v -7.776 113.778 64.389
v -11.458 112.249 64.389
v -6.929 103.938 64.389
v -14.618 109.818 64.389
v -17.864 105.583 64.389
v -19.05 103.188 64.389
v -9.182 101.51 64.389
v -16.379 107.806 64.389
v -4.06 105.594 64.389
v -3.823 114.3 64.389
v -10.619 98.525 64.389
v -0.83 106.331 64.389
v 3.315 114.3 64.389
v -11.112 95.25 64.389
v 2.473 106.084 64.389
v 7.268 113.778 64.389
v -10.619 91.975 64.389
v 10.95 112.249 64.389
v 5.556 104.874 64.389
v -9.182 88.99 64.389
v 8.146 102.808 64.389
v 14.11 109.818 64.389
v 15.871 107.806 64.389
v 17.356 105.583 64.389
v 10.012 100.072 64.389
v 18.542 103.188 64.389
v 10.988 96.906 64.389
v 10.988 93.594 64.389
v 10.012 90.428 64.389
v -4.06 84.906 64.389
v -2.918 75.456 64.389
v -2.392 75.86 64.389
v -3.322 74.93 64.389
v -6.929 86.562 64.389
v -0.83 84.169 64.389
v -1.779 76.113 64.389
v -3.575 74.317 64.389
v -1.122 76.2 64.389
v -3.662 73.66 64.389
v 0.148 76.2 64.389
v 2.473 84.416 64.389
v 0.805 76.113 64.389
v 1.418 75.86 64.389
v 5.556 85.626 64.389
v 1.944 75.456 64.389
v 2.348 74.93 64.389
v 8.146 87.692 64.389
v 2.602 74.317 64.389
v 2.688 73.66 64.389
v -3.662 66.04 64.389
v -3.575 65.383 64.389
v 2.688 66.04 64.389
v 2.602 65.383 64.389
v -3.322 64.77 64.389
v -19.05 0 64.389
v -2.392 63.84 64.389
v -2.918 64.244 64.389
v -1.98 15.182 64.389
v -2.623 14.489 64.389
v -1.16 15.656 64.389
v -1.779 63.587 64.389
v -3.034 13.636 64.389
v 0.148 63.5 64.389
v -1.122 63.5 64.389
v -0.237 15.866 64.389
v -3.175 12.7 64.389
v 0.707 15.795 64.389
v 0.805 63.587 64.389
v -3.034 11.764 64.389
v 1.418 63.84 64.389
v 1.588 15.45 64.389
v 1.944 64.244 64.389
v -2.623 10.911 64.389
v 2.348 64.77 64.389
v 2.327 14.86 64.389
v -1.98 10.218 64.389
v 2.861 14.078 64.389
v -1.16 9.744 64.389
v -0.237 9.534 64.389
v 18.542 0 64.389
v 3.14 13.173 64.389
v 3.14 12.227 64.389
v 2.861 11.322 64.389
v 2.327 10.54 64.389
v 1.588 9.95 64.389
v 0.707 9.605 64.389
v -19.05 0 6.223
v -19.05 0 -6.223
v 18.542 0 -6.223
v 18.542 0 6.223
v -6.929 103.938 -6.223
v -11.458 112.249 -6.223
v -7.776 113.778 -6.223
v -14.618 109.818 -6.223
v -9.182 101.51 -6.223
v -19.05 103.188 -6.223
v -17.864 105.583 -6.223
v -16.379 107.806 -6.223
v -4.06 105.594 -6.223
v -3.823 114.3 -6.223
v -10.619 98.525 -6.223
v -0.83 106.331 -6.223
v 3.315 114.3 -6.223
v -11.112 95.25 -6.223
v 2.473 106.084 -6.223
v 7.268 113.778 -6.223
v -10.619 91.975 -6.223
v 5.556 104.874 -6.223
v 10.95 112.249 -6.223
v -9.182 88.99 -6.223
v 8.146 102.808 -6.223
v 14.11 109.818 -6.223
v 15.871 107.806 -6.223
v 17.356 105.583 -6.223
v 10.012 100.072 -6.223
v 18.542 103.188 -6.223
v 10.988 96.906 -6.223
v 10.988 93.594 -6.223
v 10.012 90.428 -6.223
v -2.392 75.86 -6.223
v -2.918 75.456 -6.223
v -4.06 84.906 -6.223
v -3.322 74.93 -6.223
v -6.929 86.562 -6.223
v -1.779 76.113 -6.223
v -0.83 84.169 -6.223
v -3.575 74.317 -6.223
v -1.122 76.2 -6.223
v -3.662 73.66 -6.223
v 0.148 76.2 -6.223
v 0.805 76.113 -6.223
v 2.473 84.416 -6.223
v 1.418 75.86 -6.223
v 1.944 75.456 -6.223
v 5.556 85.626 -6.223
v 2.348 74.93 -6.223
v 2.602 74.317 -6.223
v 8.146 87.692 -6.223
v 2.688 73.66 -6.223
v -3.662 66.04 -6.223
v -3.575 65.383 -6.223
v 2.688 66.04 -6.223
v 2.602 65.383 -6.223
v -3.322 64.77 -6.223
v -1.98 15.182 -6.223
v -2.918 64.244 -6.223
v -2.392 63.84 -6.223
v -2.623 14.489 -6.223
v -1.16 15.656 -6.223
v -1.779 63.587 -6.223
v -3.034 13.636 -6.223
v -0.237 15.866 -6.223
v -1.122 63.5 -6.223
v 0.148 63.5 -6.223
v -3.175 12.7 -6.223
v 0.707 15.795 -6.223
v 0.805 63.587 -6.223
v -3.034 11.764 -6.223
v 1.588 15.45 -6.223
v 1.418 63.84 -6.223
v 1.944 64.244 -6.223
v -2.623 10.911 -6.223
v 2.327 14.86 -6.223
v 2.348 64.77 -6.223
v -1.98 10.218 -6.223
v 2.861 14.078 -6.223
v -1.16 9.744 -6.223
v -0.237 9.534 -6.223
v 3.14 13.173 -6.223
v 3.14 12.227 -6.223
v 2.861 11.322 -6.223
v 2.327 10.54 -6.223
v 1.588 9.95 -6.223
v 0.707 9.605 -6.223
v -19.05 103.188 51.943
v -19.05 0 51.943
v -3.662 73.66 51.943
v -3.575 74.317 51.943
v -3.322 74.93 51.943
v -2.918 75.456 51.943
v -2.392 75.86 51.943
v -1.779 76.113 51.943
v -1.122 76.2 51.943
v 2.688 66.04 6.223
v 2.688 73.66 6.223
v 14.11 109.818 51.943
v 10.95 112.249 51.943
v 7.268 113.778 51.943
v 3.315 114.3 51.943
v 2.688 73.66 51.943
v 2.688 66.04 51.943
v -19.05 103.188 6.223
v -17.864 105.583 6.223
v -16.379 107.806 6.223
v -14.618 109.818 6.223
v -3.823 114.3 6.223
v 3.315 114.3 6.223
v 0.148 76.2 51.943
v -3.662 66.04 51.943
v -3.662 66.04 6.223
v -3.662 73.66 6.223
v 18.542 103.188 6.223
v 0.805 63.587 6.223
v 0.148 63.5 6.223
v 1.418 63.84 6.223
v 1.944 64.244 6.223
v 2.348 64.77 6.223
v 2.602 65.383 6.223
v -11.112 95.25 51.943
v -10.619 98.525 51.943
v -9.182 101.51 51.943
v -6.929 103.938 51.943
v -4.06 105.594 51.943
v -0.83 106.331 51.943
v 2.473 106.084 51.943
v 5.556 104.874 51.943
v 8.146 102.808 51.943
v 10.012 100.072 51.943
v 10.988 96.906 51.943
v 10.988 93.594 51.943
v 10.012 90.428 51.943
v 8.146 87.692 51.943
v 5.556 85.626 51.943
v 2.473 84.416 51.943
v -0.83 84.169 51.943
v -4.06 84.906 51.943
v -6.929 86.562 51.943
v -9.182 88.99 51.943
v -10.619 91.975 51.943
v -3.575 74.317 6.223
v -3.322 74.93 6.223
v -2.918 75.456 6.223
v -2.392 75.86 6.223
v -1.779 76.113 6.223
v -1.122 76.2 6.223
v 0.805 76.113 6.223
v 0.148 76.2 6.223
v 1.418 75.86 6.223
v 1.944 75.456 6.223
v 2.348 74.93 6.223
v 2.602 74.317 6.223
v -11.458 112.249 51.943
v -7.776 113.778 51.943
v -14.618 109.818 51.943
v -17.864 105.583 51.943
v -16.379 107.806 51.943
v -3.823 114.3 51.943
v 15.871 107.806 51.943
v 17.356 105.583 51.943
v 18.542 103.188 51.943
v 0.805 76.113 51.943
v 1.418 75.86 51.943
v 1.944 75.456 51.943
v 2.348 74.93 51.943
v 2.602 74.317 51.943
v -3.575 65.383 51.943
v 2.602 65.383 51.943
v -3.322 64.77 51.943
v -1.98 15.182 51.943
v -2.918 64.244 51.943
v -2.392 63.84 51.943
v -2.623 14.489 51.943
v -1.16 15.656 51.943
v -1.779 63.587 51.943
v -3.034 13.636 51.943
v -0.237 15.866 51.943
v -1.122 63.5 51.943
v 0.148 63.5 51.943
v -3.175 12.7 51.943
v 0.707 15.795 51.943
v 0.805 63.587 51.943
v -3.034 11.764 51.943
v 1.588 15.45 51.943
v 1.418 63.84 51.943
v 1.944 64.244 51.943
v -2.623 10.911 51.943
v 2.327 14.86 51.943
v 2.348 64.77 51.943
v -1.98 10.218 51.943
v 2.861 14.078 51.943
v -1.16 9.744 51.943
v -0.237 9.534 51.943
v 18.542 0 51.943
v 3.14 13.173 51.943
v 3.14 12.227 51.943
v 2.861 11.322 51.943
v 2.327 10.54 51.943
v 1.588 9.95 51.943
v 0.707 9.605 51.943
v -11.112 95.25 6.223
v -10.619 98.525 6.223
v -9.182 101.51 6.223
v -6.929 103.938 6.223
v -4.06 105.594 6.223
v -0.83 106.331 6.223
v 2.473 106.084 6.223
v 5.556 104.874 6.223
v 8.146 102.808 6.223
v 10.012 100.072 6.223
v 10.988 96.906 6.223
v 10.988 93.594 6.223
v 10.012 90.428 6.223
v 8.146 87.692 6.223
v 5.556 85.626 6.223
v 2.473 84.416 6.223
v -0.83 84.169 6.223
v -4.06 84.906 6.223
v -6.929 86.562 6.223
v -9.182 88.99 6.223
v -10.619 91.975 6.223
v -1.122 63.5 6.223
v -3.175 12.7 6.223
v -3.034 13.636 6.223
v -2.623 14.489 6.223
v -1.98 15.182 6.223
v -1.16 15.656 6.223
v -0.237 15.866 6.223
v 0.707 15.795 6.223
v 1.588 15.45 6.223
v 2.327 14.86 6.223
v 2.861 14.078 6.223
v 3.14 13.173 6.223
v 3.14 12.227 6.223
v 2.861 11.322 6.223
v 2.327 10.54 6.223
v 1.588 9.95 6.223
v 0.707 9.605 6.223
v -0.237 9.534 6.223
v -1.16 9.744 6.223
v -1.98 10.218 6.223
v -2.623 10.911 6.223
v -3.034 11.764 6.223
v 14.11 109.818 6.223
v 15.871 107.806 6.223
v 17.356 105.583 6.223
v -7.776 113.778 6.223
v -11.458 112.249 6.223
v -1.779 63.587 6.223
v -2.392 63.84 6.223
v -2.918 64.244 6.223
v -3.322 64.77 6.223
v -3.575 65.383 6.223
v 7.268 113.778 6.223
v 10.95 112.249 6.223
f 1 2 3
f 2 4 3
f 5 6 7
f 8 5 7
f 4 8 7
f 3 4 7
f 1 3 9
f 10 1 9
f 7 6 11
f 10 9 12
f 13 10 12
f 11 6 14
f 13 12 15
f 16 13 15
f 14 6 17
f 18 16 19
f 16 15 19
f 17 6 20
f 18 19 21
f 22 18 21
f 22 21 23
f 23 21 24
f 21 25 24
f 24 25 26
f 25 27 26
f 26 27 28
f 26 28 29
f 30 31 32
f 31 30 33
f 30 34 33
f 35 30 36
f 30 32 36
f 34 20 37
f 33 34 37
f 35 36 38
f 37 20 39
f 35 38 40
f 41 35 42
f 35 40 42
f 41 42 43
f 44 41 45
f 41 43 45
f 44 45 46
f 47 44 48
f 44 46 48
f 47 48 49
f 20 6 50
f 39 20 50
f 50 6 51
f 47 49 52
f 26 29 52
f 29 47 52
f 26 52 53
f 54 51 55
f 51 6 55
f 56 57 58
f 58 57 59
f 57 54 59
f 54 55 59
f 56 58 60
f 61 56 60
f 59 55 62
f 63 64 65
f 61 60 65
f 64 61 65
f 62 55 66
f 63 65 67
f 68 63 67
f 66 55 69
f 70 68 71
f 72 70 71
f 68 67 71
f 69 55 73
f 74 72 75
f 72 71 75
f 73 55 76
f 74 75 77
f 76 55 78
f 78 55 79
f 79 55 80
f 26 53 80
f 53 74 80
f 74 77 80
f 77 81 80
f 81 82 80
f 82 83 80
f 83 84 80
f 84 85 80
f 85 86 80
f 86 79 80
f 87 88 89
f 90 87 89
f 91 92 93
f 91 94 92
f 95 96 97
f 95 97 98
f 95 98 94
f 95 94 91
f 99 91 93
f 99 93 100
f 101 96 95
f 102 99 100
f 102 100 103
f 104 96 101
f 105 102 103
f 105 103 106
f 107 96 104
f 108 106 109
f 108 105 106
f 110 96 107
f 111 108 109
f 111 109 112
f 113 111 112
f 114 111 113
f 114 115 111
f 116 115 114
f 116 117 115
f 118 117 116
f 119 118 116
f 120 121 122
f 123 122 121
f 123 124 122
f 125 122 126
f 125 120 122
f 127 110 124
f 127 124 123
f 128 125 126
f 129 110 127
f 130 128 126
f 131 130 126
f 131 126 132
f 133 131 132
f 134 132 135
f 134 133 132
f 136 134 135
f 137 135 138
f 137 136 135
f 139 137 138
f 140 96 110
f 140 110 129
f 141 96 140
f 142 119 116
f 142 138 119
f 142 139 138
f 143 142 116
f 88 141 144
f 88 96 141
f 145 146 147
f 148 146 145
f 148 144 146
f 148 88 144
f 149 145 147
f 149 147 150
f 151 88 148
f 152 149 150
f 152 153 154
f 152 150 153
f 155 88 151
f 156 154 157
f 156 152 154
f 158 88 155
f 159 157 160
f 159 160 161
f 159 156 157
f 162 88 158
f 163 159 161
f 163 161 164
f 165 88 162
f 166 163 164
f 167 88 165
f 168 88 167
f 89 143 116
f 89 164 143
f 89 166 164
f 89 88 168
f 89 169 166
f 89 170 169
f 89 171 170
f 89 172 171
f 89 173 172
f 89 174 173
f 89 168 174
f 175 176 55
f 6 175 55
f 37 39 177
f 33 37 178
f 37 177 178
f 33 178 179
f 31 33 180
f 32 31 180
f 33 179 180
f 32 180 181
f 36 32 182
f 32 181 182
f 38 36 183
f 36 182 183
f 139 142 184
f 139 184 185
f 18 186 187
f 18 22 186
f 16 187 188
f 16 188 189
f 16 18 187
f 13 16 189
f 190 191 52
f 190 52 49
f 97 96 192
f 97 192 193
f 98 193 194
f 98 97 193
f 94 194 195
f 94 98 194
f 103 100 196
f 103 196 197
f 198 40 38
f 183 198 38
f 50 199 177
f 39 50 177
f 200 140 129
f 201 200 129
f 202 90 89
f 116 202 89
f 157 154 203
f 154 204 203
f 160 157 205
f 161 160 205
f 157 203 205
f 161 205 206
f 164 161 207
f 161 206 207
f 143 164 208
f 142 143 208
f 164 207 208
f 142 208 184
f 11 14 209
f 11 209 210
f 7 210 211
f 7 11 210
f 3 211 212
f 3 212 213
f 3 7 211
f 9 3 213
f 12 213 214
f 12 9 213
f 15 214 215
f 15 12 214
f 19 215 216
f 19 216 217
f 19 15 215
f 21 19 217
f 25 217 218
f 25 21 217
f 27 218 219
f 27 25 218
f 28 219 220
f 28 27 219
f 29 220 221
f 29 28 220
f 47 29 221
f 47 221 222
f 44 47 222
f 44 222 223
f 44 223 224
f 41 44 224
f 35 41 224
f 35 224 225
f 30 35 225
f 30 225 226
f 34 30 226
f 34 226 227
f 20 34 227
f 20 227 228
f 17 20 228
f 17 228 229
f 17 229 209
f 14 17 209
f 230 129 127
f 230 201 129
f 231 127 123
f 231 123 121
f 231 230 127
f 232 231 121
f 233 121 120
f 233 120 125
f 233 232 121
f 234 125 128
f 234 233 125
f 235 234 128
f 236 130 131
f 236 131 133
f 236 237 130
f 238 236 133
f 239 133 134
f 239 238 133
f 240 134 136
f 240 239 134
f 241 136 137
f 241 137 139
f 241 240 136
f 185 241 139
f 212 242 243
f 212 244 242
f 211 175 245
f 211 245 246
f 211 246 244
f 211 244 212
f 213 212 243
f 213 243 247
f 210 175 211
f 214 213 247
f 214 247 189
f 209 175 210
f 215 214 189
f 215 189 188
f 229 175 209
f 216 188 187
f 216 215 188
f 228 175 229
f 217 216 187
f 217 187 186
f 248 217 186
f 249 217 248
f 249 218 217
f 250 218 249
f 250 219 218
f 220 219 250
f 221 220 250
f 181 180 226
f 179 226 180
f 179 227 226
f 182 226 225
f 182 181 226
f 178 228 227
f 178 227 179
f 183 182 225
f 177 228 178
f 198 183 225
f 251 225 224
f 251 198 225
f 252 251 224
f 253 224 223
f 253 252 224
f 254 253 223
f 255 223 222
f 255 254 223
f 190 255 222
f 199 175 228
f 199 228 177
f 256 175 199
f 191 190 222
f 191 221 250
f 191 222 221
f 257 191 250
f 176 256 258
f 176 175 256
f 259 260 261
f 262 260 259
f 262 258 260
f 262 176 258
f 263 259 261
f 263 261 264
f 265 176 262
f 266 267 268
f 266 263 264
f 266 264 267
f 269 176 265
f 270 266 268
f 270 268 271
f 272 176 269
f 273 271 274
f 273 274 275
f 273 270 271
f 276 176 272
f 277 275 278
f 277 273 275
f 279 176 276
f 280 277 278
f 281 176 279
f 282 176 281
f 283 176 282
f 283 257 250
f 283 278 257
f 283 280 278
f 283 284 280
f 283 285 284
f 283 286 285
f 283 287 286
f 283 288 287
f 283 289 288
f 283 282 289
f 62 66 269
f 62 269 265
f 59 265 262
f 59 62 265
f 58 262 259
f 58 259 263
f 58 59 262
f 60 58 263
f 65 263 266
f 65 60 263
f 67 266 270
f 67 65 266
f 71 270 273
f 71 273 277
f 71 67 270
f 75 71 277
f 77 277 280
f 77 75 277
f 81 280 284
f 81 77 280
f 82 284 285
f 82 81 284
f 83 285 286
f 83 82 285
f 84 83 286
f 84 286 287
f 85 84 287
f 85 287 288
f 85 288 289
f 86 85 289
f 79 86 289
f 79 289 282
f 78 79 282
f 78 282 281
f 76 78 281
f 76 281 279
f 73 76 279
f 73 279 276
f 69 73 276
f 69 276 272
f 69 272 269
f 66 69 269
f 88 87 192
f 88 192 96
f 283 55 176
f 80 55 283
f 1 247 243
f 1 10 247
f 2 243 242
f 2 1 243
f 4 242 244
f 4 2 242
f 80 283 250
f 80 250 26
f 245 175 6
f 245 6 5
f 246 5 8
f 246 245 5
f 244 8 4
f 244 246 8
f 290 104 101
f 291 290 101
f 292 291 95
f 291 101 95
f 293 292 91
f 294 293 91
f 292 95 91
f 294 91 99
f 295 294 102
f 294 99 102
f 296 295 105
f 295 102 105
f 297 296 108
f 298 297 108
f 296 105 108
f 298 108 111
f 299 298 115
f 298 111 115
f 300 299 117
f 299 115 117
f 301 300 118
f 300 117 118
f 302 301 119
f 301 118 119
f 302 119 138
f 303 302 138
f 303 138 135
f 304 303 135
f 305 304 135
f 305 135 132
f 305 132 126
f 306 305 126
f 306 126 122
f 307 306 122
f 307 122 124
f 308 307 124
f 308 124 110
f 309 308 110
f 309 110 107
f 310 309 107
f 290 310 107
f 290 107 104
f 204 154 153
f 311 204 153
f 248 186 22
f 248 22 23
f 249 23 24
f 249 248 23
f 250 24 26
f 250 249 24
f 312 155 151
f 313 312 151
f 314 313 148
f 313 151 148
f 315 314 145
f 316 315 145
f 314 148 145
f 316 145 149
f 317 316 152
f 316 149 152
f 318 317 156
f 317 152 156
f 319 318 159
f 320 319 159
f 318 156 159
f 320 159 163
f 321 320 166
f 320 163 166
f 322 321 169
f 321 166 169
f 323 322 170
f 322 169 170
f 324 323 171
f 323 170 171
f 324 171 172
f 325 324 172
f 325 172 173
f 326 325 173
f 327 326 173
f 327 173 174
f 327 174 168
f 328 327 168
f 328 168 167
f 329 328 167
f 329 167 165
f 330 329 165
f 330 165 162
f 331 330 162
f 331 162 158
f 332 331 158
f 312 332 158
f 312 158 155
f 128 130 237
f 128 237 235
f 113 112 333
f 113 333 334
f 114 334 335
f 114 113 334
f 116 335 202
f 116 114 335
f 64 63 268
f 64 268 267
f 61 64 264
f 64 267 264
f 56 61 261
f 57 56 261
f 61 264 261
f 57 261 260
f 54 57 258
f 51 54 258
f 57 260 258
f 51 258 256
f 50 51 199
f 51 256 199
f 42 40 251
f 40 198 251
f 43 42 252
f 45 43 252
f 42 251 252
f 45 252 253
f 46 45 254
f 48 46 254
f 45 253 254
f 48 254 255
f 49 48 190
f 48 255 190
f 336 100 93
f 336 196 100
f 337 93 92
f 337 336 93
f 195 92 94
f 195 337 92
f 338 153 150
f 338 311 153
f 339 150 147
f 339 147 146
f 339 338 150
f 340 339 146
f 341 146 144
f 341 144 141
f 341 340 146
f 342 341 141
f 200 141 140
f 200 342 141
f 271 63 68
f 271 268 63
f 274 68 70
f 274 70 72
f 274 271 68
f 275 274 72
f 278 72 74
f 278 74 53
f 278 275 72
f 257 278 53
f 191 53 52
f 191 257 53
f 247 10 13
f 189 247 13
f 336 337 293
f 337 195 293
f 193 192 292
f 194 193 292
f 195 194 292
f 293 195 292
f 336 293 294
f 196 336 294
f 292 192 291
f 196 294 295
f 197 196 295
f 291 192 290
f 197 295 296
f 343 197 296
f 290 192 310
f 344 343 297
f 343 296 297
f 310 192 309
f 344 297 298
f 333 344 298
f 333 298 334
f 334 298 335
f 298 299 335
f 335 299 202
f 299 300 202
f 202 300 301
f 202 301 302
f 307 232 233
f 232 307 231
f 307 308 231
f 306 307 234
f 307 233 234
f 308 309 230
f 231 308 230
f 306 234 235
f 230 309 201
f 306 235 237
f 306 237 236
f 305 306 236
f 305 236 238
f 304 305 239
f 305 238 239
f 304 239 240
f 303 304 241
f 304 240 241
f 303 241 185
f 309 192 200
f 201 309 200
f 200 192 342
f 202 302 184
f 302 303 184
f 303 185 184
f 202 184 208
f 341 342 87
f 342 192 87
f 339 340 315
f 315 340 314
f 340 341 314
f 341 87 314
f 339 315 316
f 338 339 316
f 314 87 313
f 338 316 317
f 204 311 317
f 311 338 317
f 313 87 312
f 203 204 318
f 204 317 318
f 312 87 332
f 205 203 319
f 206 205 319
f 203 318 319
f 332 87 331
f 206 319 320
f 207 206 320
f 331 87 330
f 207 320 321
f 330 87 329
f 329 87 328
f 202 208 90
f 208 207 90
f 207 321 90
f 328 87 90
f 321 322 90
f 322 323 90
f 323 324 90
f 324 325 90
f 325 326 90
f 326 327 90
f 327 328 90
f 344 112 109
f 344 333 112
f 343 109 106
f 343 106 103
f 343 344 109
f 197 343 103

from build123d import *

# Parameters (mm, degrees)
SKETCH2_W           = 37.592
SKETCH2_H           = 12.446
BOSS_EXTRUDE1_DEPTH = 114.3
SKETCH3_R           = 3.175
CUT_EXTRUDE1_DEPTH  = 12.7
SKETCH4_R           = 11.1125
CUT_EXTRUDE2_DEPTH  = 12.7
SKETCH5_W           = 6.35
SKETCH5_H           = 12.7
CUT_EXTRUDE3_DEPTH  = 12.7
FILLET2_R           = 2.54
FILLET3_R           = 2.54
CUT_EXTRUDE4_START  = -70.612
CUT_EXTRUDE4_DEPTH  = 70.612
FILLET4_R           = 15.24
FILLET5_R           = 15.24


with BuildPart() as part:
    # Sketch2 → Boss-Extrude1 (new body)
    with BuildSketch(Plane(origin=(0, 0, 0), x_dir=(1, 0, 0), z_dir=(0, 1, 0))):
        with Locations((-0.254, 0)):
            Rectangle(SKETCH2_W, SKETCH2_H)
    extrude(amount=BOSS_EXTRUDE1_DEPTH)

    # Sketch3 → Cut-Extrude1 (cut)
    with BuildSketch(Plane(origin=(0, 0, -6.223), x_dir=(-1, 0, 0), z_dir=(0, 0, -1))):
        with Locations((0, 12.7)):
            Circle(SKETCH3_R)
    extrude(amount=-CUT_EXTRUDE1_DEPTH, mode=Mode.SUBTRACT)

    # Sketch4 → Cut-Extrude2 (cut)
    with BuildSketch(Plane(origin=(0, 0, -6.223), x_dir=(-1, 0, 0), z_dir=(0, 0, -1))):
        with Locations((0, 95.25)):
            Circle(SKETCH4_R)
    extrude(amount=-CUT_EXTRUDE2_DEPTH, mode=Mode.SUBTRACT)

    # Sketch5 → Cut-Extrude3 (cut)
    with BuildSketch(Plane(origin=(0, 0, -6.223), x_dir=(-1, 0, 0), z_dir=(0, 0, -1))):
        with Locations((0.486934661, 69.85)):
            Rectangle(SKETCH5_W, SKETCH5_H)
    extrude(amount=-CUT_EXTRUDE3_DEPTH, mode=Mode.SUBTRACT)


with BuildPart() as body_2:
    # Mirror7: mirrored copy
    add(part.part.mirror(Plane.XY.offset(29.083)))

    # Fillet3
    fillet3_edges = [body_2.edges().sort_by_distance(p)[0] for p in [
        (2.688065339, 76.2, 58.166),
        (-3.661934661, 76.2, 58.166),
        (-3.661934661, 63.5, 58.166),
        (2.688065339, 63.5, 58.166),
    ]]
    fillet(fillet3_edges, radius=FILLET3_R)


with BuildPart() as part_1:
    add(part.part)

    # Fillet2
    fillet2_edges = [part_1.edges().sort_by_distance(p)[0] for p in [
        (2.688065339, 76.2, 0),
        (-3.661934661, 76.2, 0),
        (-3.661934661, 63.5, 0),
        (2.688065339, 63.5, 0),
    ]]
    fillet(fillet2_edges, radius=FILLET2_R)


with BuildPart() as cut_extrude4_tool:
    # Sketch6 → Cut-Extrude4 (new body)
    with BuildSketch(Plane.XY.offset(64.389).offset(CUT_EXTRUDE4_START)):
        with BuildLine():
            Line((-19.05, 114.3), (-19.05, 103.1875))
            ThreePointArc((-19.05, 103.1875), (-14.592916197, 109.842916197), (-7.9375, 114.3))
            Line((-7.9375, 114.3), (-19.05, 114.3))
        make_face()
        with BuildLine():
            Line((18.542, 114.3), (7.4295, 114.3))
            ThreePointArc((7.4295, 114.3), (14.084916197, 109.842916197), (18.542, 103.1875))
            Line((18.542, 103.1875), (18.542, 114.3))
        make_face()
    extrude(amount=CUT_EXTRUDE4_DEPTH)


with BuildPart() as part_2:
    add(part_1.part)

    # Cut-Extrude4: cut by cut_extrude4_tool
    add(cut_extrude4_tool.part, mode=Mode.SUBTRACT)

    # Fillet4
    fillet4_edges = [part_2.edges().sort_by_distance(p)[0] for p in [
        (-7.9375, 114.3, 0),
        (7.4295, 114.3, 0),
    ]]
    fillet(fillet4_edges, radius=FILLET4_R)


with BuildPart() as body_2_1:
    add(body_2.part)

    # Cut-Extrude4: cut by cut_extrude4_tool
    add(cut_extrude4_tool.part, mode=Mode.SUBTRACT)

    # Fillet5
    fillet5_edges = [body_2_1.edges().sort_by_distance(p)[0] for p in [
        (7.4295, 114.3, 58.166),
        (-7.9375, 114.3, 58.166),
    ]]
    fillet(fillet5_edges, radius=FILLET5_R)


solid = Compound([part_2.part, body_2_1.part])
